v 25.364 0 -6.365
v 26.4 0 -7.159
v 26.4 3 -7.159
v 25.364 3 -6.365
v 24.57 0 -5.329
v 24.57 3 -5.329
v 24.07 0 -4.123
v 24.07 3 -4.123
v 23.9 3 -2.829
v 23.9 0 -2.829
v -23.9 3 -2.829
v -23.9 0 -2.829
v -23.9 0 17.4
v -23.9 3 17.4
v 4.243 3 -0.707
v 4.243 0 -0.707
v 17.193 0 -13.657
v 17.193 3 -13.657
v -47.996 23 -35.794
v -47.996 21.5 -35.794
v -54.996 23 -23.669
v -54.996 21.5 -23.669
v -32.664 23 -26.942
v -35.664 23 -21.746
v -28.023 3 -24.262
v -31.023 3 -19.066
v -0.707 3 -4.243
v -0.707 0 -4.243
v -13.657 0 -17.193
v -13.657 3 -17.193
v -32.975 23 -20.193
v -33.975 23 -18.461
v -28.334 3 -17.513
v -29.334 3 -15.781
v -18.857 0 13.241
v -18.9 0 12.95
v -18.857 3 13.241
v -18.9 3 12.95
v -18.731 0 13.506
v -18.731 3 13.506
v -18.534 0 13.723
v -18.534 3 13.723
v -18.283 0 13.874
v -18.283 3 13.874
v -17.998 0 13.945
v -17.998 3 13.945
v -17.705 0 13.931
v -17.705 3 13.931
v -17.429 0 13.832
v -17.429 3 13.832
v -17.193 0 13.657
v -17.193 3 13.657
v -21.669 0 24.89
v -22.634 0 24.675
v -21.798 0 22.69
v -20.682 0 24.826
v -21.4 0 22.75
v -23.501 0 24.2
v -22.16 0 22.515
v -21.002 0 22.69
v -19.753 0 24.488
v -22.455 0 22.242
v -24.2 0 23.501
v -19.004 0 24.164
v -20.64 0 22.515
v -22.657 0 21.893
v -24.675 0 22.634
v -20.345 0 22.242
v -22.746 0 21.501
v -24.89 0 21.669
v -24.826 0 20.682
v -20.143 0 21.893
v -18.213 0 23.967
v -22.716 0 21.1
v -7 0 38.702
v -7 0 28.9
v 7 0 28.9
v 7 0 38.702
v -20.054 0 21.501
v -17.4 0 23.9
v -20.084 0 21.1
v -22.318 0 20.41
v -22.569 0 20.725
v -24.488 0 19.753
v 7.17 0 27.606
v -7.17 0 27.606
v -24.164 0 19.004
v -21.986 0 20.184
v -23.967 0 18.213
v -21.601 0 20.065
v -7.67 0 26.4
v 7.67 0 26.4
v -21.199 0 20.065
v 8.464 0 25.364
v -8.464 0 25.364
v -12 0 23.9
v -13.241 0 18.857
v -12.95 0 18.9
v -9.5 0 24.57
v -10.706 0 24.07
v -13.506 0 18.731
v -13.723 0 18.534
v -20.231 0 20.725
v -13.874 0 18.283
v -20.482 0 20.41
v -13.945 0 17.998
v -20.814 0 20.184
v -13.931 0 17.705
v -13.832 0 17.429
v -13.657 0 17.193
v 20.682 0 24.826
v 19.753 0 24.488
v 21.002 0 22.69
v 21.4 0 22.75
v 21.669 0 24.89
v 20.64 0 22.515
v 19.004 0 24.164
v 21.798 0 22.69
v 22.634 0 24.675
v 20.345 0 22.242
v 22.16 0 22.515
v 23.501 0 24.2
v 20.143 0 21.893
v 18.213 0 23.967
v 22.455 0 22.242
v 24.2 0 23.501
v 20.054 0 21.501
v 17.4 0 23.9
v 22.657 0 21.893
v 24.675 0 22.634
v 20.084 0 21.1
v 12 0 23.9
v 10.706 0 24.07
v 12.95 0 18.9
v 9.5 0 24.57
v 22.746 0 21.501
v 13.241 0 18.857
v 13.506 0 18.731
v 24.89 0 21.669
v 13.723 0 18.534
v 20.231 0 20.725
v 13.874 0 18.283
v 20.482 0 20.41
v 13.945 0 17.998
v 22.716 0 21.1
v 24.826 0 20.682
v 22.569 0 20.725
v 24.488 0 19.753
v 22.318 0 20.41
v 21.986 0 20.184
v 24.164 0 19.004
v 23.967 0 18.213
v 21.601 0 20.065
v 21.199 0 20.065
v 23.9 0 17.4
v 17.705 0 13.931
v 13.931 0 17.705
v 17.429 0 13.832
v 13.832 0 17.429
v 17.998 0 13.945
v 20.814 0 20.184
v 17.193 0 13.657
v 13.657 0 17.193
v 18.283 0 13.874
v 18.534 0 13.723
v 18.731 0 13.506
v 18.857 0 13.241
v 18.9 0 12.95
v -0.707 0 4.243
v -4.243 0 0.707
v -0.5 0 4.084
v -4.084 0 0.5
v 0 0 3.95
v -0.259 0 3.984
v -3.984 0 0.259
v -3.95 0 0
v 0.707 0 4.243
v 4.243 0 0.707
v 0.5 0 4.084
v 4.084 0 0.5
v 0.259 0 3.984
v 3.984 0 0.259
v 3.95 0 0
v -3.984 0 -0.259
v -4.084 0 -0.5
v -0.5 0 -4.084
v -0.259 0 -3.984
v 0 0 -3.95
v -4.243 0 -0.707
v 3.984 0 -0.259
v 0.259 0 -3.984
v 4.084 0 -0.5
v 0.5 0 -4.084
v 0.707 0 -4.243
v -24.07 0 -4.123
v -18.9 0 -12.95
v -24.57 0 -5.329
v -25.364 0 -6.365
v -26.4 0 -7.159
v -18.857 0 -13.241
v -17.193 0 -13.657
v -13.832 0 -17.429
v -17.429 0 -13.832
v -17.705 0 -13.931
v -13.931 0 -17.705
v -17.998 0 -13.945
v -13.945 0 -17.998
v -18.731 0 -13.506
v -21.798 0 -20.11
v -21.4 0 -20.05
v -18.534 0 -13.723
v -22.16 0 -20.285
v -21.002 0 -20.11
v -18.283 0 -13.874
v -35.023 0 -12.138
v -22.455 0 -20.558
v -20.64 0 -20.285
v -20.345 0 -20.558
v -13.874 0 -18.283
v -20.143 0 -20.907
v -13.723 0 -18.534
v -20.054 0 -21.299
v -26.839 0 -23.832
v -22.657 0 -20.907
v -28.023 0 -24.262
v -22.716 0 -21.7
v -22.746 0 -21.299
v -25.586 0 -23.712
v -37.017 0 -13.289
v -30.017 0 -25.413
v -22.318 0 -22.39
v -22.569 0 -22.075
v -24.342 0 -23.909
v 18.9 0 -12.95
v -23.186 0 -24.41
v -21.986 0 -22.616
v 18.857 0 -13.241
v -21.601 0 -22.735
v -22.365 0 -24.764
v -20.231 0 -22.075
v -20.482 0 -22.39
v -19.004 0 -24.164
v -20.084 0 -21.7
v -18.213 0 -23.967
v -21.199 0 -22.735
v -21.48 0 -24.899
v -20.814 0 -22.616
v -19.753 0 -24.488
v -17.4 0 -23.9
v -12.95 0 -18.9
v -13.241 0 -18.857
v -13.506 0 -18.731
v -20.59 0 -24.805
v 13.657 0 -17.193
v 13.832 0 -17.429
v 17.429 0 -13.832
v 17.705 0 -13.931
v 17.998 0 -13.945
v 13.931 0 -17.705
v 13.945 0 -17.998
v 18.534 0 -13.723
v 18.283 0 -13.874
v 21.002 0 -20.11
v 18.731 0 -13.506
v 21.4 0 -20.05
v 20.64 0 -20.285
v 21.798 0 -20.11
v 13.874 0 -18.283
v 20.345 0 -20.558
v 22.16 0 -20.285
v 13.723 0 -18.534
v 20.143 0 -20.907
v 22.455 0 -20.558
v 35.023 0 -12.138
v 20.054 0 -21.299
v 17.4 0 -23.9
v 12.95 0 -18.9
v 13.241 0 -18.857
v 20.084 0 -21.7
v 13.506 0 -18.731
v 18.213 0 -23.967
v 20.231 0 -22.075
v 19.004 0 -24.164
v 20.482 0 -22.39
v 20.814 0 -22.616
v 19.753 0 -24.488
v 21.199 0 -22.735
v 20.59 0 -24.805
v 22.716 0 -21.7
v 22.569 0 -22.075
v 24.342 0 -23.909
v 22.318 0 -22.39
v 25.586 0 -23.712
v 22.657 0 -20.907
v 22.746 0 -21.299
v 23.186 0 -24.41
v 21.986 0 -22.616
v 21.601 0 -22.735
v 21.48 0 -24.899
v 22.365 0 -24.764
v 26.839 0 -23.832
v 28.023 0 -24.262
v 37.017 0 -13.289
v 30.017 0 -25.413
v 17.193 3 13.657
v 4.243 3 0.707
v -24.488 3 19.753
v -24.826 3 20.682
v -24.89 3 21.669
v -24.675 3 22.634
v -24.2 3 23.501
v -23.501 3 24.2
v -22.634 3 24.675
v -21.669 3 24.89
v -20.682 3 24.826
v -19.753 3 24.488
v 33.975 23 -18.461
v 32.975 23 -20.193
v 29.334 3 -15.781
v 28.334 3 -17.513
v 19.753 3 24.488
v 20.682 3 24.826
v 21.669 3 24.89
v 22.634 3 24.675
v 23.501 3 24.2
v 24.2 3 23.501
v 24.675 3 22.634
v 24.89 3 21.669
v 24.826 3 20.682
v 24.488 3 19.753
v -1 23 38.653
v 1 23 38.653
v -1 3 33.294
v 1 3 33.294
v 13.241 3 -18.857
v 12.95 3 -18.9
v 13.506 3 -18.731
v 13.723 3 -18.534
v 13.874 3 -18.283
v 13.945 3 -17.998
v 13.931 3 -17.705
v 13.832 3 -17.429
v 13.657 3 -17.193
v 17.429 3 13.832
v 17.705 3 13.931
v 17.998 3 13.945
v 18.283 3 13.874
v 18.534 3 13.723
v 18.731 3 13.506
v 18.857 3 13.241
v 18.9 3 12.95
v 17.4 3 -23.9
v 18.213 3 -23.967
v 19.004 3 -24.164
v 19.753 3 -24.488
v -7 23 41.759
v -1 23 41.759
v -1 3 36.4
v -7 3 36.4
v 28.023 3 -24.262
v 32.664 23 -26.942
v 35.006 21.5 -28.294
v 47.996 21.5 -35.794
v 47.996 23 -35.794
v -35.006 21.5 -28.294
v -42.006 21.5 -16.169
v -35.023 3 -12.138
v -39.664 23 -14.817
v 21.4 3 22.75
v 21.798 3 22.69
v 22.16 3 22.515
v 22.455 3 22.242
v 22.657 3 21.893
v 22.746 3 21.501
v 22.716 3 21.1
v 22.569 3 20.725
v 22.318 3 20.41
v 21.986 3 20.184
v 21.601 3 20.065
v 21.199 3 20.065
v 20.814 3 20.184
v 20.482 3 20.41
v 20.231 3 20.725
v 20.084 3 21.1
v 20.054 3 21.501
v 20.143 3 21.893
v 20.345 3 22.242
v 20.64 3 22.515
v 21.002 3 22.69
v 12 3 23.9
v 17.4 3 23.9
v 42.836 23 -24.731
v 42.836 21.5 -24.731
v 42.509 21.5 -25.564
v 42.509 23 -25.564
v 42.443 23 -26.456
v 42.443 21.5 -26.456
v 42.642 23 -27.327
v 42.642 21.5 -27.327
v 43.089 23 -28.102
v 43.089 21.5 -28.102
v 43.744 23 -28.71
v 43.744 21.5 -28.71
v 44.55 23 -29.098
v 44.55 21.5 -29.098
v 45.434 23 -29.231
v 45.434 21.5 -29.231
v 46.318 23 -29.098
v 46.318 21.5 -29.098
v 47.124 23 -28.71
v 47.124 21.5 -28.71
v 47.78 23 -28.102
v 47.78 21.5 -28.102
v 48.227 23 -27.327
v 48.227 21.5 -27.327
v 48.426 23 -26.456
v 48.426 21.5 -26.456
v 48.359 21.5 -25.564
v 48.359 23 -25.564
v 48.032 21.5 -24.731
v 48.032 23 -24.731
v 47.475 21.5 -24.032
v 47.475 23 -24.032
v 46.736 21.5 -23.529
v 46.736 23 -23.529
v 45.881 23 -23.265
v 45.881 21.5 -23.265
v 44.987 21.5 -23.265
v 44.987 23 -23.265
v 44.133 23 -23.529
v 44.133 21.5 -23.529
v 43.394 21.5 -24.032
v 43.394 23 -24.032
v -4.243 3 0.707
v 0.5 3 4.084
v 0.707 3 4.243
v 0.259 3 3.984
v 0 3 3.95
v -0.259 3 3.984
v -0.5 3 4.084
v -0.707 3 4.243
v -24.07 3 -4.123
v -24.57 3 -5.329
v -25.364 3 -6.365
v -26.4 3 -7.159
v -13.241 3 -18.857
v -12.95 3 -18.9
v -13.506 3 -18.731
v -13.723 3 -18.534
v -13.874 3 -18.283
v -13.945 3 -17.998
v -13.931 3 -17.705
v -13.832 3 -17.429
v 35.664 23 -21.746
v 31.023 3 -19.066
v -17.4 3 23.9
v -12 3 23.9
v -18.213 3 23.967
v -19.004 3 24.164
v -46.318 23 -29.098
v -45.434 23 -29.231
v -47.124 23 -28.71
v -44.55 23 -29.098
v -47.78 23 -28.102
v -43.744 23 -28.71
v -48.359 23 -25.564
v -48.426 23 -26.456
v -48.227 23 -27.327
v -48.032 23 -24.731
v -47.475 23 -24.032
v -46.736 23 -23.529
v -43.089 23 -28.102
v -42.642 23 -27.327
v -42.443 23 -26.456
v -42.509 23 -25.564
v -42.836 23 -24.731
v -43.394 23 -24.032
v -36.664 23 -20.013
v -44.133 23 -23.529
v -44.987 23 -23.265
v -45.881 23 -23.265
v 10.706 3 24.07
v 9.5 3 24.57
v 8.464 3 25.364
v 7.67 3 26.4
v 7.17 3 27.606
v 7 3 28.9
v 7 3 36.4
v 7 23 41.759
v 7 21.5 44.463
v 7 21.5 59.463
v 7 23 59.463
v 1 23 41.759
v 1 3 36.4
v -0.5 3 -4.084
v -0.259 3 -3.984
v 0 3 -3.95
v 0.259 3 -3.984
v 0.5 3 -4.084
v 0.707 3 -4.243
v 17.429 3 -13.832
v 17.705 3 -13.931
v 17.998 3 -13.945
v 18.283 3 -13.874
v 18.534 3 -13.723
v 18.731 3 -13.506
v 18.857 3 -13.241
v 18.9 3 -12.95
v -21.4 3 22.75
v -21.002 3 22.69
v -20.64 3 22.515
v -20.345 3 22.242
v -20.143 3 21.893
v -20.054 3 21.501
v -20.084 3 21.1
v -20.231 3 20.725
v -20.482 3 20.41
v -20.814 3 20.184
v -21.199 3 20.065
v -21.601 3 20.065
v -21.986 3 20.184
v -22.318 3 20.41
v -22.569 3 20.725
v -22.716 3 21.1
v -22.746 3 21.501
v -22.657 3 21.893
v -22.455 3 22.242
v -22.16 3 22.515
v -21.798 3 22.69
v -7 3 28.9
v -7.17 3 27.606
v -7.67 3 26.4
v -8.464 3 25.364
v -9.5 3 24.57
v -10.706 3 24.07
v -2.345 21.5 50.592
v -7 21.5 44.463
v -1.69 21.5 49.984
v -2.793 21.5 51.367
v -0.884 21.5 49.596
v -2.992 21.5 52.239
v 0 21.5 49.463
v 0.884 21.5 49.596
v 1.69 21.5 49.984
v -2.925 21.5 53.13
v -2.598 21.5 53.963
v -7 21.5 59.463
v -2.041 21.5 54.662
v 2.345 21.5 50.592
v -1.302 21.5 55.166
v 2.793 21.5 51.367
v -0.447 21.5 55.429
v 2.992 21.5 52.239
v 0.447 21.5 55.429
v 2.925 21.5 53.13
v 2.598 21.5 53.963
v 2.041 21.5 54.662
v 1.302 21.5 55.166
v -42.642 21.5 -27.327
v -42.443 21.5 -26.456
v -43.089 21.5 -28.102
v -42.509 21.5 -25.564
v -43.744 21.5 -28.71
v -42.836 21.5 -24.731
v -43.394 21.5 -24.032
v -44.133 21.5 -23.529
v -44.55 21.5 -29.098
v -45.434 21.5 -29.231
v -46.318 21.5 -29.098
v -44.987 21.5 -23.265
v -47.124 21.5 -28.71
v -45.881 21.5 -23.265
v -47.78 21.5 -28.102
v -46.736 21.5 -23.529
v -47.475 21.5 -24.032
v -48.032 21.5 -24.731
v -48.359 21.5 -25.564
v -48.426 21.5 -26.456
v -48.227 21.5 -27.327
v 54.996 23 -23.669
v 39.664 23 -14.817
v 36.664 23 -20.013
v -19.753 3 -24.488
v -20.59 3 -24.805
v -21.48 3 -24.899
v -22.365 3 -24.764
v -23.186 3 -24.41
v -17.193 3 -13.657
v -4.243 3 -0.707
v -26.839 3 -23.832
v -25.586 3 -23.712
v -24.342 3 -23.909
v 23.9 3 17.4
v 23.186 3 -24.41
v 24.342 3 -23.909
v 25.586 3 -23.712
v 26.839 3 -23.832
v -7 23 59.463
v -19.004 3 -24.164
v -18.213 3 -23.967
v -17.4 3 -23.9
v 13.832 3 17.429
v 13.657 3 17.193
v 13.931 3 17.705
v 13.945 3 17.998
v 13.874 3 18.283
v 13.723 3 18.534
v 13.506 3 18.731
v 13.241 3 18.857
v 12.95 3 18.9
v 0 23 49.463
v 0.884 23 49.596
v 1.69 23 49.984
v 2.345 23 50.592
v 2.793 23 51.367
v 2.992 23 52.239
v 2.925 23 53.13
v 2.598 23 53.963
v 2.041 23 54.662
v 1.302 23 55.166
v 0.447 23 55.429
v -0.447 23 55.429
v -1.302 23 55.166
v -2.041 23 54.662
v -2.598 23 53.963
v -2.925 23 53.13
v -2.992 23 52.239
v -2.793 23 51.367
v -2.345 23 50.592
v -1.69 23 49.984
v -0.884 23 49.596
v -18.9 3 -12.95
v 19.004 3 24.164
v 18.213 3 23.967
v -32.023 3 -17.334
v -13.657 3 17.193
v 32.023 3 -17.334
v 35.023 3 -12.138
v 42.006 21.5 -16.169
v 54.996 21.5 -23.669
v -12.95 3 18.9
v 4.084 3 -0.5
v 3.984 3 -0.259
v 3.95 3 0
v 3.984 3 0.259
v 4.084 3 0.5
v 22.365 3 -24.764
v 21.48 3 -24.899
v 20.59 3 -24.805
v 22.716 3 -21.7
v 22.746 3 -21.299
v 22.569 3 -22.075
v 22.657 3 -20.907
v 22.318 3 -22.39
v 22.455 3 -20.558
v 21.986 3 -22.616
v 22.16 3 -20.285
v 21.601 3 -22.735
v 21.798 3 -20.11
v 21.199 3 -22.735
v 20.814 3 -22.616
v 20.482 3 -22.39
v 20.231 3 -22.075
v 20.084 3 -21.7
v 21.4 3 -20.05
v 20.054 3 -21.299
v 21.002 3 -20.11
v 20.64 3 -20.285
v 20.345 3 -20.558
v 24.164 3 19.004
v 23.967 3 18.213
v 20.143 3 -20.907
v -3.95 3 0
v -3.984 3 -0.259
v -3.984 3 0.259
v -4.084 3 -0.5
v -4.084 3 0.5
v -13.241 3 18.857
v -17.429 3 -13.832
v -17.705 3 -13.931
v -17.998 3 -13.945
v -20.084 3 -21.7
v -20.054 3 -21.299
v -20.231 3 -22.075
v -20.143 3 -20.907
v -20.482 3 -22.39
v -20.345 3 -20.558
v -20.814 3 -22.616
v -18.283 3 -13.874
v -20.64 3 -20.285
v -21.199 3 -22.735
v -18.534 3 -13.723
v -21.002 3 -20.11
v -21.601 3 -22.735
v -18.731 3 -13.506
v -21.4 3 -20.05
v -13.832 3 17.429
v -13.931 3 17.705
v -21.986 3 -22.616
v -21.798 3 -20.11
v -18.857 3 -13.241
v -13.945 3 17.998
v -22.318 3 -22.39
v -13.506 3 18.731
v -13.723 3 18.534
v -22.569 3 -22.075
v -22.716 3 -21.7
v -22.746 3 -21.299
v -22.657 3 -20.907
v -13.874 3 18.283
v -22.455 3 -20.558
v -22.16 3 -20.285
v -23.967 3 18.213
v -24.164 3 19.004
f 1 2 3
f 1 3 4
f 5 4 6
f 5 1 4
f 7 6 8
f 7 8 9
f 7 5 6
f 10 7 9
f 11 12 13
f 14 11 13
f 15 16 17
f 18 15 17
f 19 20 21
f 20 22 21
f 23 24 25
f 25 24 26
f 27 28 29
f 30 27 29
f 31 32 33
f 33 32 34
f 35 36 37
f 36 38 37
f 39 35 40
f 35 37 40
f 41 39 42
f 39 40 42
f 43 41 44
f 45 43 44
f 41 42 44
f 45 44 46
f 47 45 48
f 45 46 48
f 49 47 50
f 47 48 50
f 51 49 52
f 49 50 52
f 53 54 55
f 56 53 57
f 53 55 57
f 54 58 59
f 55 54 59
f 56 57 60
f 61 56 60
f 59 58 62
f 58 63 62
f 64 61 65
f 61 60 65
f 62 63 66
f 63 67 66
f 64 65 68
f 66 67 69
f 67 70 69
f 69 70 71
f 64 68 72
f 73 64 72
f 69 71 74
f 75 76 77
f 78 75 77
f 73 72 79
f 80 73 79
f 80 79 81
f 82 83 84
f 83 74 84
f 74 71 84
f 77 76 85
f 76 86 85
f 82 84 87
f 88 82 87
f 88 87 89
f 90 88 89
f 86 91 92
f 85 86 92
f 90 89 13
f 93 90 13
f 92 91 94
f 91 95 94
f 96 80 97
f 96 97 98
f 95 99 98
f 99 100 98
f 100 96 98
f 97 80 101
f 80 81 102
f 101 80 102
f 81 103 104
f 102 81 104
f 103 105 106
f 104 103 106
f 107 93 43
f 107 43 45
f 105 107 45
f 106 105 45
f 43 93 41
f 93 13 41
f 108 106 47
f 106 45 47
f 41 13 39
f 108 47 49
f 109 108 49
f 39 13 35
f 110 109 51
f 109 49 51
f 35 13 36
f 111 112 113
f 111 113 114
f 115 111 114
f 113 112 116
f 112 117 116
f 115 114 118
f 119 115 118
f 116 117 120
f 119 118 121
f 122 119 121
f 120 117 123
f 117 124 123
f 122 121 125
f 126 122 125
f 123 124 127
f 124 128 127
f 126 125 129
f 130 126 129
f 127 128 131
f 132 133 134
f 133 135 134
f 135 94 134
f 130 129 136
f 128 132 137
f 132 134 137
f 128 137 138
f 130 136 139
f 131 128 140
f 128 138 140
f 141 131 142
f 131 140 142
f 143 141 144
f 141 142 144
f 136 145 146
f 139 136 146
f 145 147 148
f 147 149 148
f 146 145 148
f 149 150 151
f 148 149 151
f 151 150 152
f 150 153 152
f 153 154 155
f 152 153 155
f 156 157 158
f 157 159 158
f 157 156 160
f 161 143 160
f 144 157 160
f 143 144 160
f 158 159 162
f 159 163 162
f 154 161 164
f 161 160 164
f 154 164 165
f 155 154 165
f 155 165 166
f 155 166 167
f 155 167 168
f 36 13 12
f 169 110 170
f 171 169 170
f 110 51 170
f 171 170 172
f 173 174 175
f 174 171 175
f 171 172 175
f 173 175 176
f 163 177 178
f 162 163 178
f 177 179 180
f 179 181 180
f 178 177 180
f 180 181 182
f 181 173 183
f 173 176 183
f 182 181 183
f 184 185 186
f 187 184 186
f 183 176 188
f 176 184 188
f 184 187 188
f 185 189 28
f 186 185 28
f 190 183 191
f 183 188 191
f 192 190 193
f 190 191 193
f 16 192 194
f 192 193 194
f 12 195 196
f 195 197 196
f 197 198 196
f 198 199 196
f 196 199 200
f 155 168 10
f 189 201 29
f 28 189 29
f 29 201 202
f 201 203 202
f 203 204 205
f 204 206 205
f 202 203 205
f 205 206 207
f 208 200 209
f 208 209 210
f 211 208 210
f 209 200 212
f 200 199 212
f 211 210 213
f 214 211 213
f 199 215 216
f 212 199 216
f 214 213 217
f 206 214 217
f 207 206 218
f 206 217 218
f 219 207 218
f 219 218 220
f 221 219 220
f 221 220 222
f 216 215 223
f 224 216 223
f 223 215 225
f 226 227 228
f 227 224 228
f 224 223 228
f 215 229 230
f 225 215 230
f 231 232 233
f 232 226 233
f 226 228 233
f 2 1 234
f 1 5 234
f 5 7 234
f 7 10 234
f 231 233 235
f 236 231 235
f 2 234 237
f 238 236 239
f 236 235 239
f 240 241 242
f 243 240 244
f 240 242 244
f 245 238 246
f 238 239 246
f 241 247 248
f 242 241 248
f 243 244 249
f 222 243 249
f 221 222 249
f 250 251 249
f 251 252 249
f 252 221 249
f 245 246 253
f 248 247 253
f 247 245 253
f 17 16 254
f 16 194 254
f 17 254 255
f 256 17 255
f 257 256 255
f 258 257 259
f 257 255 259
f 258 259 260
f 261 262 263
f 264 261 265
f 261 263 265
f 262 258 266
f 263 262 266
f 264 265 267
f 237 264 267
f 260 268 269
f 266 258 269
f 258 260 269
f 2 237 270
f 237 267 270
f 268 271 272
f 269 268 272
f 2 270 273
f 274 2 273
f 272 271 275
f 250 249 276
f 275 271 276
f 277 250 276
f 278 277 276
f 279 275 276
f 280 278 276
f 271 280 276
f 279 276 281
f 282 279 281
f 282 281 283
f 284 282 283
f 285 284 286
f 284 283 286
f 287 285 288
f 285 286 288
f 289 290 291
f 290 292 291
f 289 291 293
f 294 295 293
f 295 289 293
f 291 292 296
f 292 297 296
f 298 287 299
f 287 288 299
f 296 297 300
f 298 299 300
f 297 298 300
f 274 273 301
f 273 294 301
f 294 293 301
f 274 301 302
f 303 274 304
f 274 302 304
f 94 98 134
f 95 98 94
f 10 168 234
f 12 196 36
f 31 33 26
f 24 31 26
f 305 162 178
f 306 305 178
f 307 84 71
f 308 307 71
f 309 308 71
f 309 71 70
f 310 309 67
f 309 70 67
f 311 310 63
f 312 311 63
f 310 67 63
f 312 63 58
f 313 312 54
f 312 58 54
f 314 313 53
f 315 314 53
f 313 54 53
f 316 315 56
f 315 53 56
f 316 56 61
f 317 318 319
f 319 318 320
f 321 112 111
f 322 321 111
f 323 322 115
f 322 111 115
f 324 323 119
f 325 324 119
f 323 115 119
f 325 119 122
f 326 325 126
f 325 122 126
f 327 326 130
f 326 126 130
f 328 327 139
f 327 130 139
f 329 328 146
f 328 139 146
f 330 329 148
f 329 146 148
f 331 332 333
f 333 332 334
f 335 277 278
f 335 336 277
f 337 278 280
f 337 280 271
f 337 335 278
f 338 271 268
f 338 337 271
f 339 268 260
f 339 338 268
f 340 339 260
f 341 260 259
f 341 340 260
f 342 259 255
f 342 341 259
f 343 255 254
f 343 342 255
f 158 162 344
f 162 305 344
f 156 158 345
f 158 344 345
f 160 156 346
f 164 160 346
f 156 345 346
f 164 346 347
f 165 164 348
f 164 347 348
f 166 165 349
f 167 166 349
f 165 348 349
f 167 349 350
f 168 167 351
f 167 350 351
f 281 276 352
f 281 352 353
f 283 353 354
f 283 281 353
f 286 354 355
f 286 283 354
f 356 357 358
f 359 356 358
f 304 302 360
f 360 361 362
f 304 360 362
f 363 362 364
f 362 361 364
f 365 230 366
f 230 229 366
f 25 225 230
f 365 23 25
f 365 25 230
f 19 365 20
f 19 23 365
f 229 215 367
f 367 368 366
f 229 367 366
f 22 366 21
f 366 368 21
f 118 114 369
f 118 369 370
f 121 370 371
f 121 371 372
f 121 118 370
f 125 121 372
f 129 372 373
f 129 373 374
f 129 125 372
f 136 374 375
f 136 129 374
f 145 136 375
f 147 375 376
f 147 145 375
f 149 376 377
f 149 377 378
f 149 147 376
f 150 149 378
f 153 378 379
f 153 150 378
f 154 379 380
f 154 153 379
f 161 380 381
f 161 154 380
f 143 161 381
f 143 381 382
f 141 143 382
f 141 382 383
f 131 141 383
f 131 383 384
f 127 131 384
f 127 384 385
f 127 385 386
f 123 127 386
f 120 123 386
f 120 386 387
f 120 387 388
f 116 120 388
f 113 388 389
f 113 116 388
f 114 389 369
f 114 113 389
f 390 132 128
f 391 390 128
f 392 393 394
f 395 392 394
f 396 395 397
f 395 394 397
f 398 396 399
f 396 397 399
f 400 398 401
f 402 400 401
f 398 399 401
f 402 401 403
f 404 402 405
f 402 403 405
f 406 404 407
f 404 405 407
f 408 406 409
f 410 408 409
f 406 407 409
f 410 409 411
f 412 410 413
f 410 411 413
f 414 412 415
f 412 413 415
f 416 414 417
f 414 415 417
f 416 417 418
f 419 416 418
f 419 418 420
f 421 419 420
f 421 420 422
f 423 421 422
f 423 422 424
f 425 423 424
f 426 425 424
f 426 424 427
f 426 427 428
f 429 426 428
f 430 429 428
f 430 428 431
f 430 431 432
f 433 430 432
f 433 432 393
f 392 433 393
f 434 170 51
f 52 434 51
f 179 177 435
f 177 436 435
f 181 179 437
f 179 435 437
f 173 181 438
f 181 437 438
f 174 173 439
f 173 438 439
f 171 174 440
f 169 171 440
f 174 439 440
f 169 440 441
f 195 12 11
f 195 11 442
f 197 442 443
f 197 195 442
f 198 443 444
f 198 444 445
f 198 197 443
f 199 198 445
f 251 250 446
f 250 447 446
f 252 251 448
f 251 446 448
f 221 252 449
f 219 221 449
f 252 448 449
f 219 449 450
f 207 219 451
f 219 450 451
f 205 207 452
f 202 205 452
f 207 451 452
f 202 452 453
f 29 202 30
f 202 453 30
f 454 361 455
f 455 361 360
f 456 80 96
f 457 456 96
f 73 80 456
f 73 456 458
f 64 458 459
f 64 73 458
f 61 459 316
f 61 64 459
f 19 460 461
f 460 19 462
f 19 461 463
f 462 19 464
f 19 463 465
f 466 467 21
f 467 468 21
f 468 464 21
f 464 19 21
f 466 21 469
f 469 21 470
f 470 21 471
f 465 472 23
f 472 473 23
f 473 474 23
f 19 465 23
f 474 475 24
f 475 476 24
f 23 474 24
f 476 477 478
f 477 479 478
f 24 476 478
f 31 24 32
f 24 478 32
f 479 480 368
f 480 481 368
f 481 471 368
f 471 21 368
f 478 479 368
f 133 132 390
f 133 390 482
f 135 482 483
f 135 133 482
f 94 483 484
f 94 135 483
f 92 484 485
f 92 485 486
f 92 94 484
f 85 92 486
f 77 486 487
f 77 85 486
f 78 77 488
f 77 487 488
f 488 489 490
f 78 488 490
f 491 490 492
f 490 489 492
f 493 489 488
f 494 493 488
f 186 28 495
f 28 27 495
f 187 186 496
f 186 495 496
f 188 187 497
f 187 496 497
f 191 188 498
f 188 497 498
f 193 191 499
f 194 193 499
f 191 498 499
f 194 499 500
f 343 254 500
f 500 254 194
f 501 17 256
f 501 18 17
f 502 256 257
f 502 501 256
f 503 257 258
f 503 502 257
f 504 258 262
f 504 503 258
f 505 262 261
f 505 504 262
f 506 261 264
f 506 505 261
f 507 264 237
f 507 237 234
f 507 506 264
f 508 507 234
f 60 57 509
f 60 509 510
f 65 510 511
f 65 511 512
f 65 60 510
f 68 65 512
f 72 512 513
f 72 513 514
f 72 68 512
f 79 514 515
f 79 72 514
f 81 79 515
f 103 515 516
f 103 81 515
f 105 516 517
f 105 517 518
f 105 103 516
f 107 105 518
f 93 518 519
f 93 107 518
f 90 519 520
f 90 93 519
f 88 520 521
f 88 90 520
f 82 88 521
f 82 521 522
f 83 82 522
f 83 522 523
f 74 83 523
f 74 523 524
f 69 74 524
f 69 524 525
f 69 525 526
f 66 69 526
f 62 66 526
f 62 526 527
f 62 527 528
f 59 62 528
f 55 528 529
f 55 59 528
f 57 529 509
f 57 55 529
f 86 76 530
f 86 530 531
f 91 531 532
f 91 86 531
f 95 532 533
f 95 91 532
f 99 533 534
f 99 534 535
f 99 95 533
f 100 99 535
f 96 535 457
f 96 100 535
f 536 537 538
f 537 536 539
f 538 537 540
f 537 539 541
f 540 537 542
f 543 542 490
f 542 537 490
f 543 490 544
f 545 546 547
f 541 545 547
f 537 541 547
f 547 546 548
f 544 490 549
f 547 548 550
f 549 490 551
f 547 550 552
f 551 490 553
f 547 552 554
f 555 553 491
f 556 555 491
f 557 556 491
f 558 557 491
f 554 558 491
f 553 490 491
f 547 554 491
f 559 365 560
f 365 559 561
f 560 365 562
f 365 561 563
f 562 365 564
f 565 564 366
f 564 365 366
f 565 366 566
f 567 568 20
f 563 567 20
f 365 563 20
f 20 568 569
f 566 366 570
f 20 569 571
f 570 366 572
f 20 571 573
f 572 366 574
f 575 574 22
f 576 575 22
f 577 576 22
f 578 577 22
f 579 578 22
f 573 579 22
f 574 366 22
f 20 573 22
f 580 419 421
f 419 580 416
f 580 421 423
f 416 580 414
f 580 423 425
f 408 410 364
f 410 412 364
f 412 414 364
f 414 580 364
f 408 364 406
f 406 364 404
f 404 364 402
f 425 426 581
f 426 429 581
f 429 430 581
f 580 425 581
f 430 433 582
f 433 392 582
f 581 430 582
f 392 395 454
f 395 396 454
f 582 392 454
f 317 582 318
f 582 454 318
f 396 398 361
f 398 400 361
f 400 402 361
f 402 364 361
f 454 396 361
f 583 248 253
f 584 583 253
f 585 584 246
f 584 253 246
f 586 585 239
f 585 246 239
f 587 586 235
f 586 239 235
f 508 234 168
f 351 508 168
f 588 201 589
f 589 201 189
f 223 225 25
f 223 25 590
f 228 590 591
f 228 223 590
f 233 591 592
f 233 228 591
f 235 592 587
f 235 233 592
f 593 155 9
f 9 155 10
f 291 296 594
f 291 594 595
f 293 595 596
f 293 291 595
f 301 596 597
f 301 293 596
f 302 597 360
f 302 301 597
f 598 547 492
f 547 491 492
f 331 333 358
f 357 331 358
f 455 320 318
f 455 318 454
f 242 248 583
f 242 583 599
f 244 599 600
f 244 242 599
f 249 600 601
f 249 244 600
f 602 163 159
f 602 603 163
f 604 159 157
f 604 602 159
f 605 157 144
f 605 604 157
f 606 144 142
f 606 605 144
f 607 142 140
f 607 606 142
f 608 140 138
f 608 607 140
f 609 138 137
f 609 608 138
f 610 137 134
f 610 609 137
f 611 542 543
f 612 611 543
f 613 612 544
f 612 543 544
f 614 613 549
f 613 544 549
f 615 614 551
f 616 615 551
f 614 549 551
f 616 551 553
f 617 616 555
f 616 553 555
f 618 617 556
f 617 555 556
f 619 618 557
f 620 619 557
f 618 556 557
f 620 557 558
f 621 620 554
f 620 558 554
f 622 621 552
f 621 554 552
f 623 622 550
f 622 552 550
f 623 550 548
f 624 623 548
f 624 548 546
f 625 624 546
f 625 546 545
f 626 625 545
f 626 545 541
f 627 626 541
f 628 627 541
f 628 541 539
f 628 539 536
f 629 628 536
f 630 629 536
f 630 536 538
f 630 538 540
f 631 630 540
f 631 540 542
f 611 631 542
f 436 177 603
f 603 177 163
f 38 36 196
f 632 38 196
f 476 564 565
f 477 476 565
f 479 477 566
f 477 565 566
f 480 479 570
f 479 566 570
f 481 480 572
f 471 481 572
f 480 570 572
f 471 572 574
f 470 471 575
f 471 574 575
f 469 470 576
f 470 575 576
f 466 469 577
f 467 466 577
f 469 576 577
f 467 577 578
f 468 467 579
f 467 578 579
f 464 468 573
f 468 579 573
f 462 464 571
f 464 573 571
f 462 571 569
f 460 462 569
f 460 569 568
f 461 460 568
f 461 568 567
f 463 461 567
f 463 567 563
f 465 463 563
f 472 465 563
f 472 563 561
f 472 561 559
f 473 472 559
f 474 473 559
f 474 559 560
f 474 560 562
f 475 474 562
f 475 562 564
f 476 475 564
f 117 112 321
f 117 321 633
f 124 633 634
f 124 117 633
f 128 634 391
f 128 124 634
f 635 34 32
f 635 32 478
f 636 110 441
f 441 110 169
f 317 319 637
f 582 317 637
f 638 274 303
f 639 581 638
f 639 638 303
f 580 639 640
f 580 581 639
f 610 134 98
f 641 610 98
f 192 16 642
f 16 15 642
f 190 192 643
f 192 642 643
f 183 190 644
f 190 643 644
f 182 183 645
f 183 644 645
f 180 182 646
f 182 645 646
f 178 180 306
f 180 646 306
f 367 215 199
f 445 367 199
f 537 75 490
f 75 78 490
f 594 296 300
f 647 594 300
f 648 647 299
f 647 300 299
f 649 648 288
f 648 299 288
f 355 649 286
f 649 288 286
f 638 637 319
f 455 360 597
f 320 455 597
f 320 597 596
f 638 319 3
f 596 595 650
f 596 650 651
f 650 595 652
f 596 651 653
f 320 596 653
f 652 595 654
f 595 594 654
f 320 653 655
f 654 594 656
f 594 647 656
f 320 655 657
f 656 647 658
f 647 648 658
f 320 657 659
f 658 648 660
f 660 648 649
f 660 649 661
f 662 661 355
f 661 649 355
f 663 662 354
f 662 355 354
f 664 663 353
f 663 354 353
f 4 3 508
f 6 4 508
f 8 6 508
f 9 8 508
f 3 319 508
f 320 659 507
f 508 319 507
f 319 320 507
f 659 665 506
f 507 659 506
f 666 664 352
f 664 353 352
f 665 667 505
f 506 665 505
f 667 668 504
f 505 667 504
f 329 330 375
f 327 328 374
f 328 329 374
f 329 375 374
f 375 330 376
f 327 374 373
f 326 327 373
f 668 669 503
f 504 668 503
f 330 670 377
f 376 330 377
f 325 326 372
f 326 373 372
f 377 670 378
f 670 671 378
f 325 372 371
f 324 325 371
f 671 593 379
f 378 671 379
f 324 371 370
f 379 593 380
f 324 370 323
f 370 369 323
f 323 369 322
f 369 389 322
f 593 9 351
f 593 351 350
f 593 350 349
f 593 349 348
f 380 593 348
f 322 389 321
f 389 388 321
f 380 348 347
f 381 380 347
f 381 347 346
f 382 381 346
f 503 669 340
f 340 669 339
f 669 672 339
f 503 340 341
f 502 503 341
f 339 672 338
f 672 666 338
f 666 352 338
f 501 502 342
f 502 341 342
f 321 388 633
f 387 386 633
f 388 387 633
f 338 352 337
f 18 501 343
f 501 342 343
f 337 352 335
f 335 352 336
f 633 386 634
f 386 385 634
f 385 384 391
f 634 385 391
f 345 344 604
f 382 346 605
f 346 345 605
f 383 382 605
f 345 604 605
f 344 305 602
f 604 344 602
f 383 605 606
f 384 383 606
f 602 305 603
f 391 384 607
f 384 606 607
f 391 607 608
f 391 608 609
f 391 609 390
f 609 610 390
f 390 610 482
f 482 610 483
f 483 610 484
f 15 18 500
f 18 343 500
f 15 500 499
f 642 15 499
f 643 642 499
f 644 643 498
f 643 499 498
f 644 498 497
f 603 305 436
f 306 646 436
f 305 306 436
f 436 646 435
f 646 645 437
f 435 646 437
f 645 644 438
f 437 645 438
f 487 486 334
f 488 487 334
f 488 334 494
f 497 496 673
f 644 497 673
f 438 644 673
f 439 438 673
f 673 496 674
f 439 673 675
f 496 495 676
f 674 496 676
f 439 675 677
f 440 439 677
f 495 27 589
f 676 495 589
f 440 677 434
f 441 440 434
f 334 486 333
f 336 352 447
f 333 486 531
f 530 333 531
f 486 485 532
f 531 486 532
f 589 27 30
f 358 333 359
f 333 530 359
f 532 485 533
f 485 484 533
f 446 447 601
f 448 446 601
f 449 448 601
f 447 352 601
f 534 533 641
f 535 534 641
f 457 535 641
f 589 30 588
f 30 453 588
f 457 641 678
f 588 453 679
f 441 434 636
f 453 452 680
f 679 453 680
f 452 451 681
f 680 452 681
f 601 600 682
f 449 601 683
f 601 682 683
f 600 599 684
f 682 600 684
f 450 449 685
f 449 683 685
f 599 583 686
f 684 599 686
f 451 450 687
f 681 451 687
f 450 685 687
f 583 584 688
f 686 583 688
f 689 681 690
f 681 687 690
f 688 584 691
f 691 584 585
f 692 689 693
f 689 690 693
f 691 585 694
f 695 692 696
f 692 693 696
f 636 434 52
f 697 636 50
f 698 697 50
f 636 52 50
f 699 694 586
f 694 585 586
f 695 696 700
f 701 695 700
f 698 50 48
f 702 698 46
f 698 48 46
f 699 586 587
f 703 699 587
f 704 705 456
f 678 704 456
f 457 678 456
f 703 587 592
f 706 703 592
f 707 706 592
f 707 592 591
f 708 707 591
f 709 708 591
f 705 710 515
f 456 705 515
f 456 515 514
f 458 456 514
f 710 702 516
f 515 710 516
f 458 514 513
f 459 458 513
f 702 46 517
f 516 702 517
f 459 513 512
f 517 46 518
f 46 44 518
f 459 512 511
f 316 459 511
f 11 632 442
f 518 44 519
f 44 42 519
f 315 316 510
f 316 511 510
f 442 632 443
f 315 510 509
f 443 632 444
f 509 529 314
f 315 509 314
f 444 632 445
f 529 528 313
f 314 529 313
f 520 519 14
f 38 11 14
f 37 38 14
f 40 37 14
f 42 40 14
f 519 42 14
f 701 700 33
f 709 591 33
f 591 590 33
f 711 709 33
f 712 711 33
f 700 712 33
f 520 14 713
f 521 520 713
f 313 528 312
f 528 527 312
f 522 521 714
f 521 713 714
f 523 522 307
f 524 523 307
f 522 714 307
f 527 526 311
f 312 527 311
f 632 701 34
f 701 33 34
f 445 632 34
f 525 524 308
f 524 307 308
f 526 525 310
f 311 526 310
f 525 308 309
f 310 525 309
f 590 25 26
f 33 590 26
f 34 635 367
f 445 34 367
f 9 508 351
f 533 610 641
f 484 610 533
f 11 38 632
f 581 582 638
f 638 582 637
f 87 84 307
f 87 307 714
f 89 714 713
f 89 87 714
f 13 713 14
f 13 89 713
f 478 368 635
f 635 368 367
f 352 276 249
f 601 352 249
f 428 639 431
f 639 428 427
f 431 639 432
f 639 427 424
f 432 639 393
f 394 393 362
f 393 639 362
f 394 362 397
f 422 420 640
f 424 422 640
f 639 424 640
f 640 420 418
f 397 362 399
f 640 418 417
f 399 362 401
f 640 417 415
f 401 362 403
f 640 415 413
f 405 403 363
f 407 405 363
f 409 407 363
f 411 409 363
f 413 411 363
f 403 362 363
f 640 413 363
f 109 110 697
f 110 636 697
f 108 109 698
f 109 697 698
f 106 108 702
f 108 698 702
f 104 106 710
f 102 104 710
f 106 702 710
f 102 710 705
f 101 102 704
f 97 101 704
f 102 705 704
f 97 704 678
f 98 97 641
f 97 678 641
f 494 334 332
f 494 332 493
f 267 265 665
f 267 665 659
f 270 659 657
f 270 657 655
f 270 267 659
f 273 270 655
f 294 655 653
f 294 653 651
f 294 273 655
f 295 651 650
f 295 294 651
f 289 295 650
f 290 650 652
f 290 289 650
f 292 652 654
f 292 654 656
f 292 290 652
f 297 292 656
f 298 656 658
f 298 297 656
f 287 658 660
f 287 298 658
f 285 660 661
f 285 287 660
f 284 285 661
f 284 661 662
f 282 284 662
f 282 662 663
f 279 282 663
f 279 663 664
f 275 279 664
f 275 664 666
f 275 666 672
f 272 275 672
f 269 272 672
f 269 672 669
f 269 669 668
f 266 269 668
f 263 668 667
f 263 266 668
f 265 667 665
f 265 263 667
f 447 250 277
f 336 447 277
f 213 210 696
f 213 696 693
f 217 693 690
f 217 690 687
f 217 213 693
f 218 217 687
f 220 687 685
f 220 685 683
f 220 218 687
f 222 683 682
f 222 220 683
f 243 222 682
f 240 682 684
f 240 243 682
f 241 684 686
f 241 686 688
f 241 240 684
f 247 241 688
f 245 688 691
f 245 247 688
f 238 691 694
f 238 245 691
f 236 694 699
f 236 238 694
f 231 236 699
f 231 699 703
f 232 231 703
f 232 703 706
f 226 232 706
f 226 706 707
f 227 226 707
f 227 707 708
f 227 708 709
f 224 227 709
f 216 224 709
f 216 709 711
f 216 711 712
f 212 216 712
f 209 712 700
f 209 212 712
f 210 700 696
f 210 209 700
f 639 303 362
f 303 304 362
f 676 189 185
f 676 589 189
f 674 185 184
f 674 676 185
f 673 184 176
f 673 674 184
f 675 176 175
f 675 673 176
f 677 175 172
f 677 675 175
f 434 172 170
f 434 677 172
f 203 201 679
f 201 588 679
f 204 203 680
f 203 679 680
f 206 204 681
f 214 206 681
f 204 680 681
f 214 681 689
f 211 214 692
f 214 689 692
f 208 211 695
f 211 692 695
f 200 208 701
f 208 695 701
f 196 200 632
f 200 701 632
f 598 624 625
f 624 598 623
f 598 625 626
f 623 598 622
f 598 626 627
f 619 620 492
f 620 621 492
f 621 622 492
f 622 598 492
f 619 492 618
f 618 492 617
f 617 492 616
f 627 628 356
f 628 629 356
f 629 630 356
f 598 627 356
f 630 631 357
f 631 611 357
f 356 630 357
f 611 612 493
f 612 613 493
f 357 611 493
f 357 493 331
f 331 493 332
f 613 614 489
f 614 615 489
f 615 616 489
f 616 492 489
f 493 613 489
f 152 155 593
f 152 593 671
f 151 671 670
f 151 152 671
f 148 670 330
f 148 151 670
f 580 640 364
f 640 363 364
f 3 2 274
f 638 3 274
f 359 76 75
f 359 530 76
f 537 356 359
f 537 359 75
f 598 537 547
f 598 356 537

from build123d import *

# Parameters (mm, degrees)
SKETCH1_R           = 1.35
BOSS_EXTRUDE1_DEPTH = 3
FILLET1_R           = 5
FILLET2_R           = 1
BOSS_EXTRUDE2_DEPTH = 7
BOSS_EXTRUDE3_DEPTH = 1
CUT_EXTRUDE1_REACH  = 74.282
SKETCH3_R           = 3
CIRPATTERN3_COUNT   = 3


with BuildPart() as part:
    # Sketch1 → Boss-Extrude1 (new body)
    with BuildSketch(Plane(origin=(0, 0, 0), x_dir=(1, 0, 0), z_dir=(0, 1, 0))):
        with BuildLine():
            ThreePointArc((-18.950510257, 23.9), (-22.286742625, 24.785806775), (-24.760474821, 22.378370572))
            Line((-24.760474821, 22.378370572), (-28.023324698, 24.262177826))
            Line((-28.023324698, 24.262177826), (-35.023324698, 12.137822174))
            Line((-35.023324698, 12.137822174), (-23.9, 5.715767665))
            Line((-23.9, 5.715767665), (-23.9, -18.950510257))
            ThreePointArc((-23.9, -18.950510257), (-23.874873734, -23.874873734), (-18.950510257, -23.9))
            Line((-18.950510257, -23.9), (-7, -23.9))
            Line((-7, -23.9), (-7, -36.4))
            Line((-7, -36.4), (7, -36.4))
            Line((7, -36.4), (7, -23.9))
            Line((7, -23.9), (18.950510257, -23.9))
            ThreePointArc((18.950510257, -23.9), (23.874873734, -23.874873734), (23.9, -18.950510257))
            Line((23.9, -18.950510257), (23.9, 5.715767665))
            Line((23.9, 5.715767665), (35.023324698, 12.137822174))
            Line((35.023324698, 12.137822174), (28.023324698, 24.262177826))
            Line((28.023324698, 24.262177826), (24.760474821, 22.378370572))
            ThreePointArc((24.760474821, 22.378370572), (22.286742625, 24.785806775), (18.950510257, 23.9))
            Line((18.950510257, 23.9), (-18.950510257, 23.9))
        make_face()
        with Locations(Location((-21.4, -21.4, 0), (0, 0, 270))):
            Circle(SKETCH1_R, mode=Mode.SUBTRACT)
        Polygon((15.364466094, -18.9), (-15.364466094, -18.9), (0, -3.535533906), align=None, mode=Mode.SUBTRACT)
        with Locations(Location((21.4, -21.4, 0), (0, 0, 270))):
            Circle(SKETCH1_R, mode=Mode.SUBTRACT)
        Polygon((-3.535533906, 0), (-18.9, -15.364466094), (-18.9, 15.364466094), align=None, mode=Mode.SUBTRACT)
        with Locations(Location((-21.4, 21.4, 0), (0, 0, 270))):
            Circle(SKETCH1_R, mode=Mode.SUBTRACT)
        Polygon((18.9, -15.364466094), (3.535533906, 0), (18.9, 15.364466094), align=None, mode=Mode.SUBTRACT)
        Polygon((0, 3.535533906), (-15.364466094, 18.9), (15.364466094, 18.9), align=None, mode=Mode.SUBTRACT)
        with Locations(Location((21.4, 21.4, 0), (0, 0, 270))):
            Circle(SKETCH1_R, mode=Mode.SUBTRACT)
    extrude(amount=BOSS_EXTRUDE1_DEPTH)

    # Fillet1
    # the kernel refuses this fillet: 5 mm, written as the material it adds along each edge
    with BuildSketch(Plane(origin=(7, 0, 23.9), x_dir=(0, 0, 1), z_dir=(0, 1, 0)), Plane(origin=(-7, 0, 23.9), x_dir=(-1, 0, 0), z_dir=(0, 1, 0))) as fillet1_piece_1:
        with BuildLine():
            CenterArc((FILLET1_R, FILLET1_R), FILLET1_R, 180, 90)
            Line((0, FILLET1_R), (-FILLET1_R * 0.02, FILLET1_R))
            Line((-FILLET1_R * 0.02, FILLET1_R), (-FILLET1_R * 0.02, -FILLET1_R * 0.02))
            Line((-FILLET1_R * 0.02, -FILLET1_R * 0.02), (FILLET1_R, -FILLET1_R * 0.02))
            Line((FILLET1_R, -FILLET1_R * 0.02), (FILLET1_R, 0))
        make_face()
    extrude(amount=3)
    with BuildSketch(Plane(origin=(23.9, 0, 18.950510257), x_dir=(0.5912237553807399, 0, 0.8065075765753815), z_dir=(0, 1, 0)), Plane(origin=(-18.950510257, 0, 23.9), x_dir=(-0.806507576575308, 0, 0.5912237553808403), z_dir=(0, 1, 0)), Plane(origin=(18.950510257, 0, -23.9), x_dir=(0.8065075765752107, 0, -0.591223755380973), z_dir=(0, 1, 0))) as fillet1_piece_2:
        with BuildLine():
            CenterArc((1.705620507, 4.94923638), FILLET1_R, 233.756102233, 28.072486936)
            Line((-1.25049827, 0.916698497), (-1.309620646, 0.836047739))
            Line((-1.309620646, 0.836047739), (-0.059122376, -0.080650758))
            Line((-0.059122376, -0.080650758), (0.014213504, -0.098984728))
            ThreePointArc((0.014213504, -0.098984728), (0.497472648, -0.064465466), (0.980731791, -0.098984728))
            Line((0.980731791, -0.098984728), (0.994945296, 0))
        make_face()
    extrude(amount=3)
    with BuildSketch(Plane(origin=(18.950510257, 0, 23.9), x_dir=(-1, 0, 0), z_dir=(0, 1, 0)), Plane(origin=(-23.9, 0, 18.950510257), x_dir=(0, 0, -1), z_dir=(0, 1, 0)), Plane(origin=(-18.950510257, 0, -23.9), x_dir=(1, 0, 0), z_dir=(0, 1, 0))) as fillet1_piece_3:
        with BuildLine():
            CenterArc((1.550510257, 5), FILLET1_R, 241.927513064, 28.072486936)
            Line((-0.802430919, 0.588235294), (-0.849489743, 0.5))
            ThreePointArc((-0.849489743, 0.5), (-0.439328974, 0.24212576), (-0.069985421, -0.071428571))
            Line((-0.069985421, -0.071428571), (0, -0.1))
            Line((0, -0.1), (1.550510257, -0.1))
            Line((1.550510257, -0.1), (1.550510257, 0))
        make_face()
    extrude(amount=3)
    with BuildSketch(Plane(origin=(-23.9, 0, -5.715767665), x_dir=(-0.8660254037844421, 0, -0.49999999999999417), z_dir=(0, 1, 0)), Plane(origin=(23.9, 0, -5.715767665), x_dir=(0, 0, 1), z_dir=(0, 1, 0))) as fillet1_piece_4:
        with BuildLine():
            CenterArc((FILLET1_R * 0.57735026919, FILLET1_R), FILLET1_R, 210, 60)
            Line((-FILLET1_R * 0.288675134595, FILLET1_R * 0.5), (-FILLET1_R * 0.30599564267, FILLET1_R * 0.49))
            Line((-FILLET1_R * 0.30599564267, FILLET1_R * 0.49), (-FILLET1_R * 0.0115470053838, -FILLET1_R * 0.02))
            Line((-FILLET1_R * 0.0115470053838, -FILLET1_R * 0.02), (FILLET1_R * 0.57735026919, -FILLET1_R * 0.02))
            Line((FILLET1_R * 0.57735026919, -FILLET1_R * 0.02), (FILLET1_R * 0.57735026919, 0))
        make_face()
    extrude(amount=3)
    with BuildSketch(Plane(origin=(24.760474821, 0, -22.378370572), x_dir=(-0.6125107821213894, 0, -0.7904622329909531), z_dir=(0, 1, 0))) as fillet1_piece_5:
        with BuildLine():
            CenterArc((4.405584254, -4.650844222), FILLET1_R, 111.538849964, 57.883583887)
            Line((-0.509452241, -3.733011854), (-0.607752971, -3.714655207))
            ThreePointArc((-0.607752971, -3.714655207), (-0.353807697, -1.852984049), (-0.099081577, 0.013521878))
            Line((-0.099081577, 0.013521878), (0.036713202, 0.093016884))
            ThreePointArc((0.036713202, 0.093016884), (1.284962074, -0.144409045), (2.533210946, 0.093016884))
            Line((2.533210946, 0.093016884), (2.569924148, 0))
        make_face()
    extrude(amount=3)
    with BuildSketch(Plane(origin=(-24.760474821, 0, -22.378370572), x_dir=(0.6125107821216187, 0, -0.7904622329907753), z_dir=(0, 1, 0))) as fillet1_piece_6:
        with BuildLine():
            CenterArc((4.405584254, 4.650844222), FILLET1_R, 190.577566149, 57.883583887)
            Line((-0.509452241, 3.733011854), (-0.607752971, 3.714655207))
            ThreePointArc((-0.607752971, 3.714655207), (-0.353807697, 1.852984049), (-0.099081577, -0.013521878))
            Line((-0.099081577, -0.013521878), (0.036713202, -0.093016884))
            ThreePointArc((0.036713202, -0.093016884), (1.284962074, 0.144409045), (2.533210946, -0.093016884))
            Line((2.533210946, -0.093016884), (2.569924148, 0))
        make_face()
    extrude(amount=3)

    # Fillet2
    fillet2_edges = [part.edges().sort_by_distance(p)[0] for p in [
        (15.364466094, 1.5, -18.9),
        (-15.364466094, 1.5, -18.9),
        (0, 1.5, -3.535533906),
        (-18.9, 1.5, 15.364466094),
        (-3.535533906, 1.5, 0),
        (-18.9, 1.5, -15.364466094),
        (18.9, 1.5, 15.364466094),
        (18.9, 1.5, -15.364466094),
        (3.535533906, 1.5, 0),
        (-15.364466094, 1.5, 18.9),
        (15.364466094, 1.5, 18.9),
        (0, 1.5, 3.535533906),
    ]]
    fillet(fillet2_edges, radius=FILLET2_R)

    # Sketch2 → Boss-Extrude2 (add, symmetric)
    with BuildSketch(Plane(origin=(0, 0, 0), x_dir=(0, 0, -1), z_dir=(1, 0, 0))):
        Polygon((-36.4, 3), (-36.4, 0), (-38.701980964, 0), (-44.462888601, 21.5), (-59.462888601, 21.5), (-59.462888601, 23), (-41.758983849, 23), align=None)
    boss_extrude2 = extrude(amount=BOSS_EXTRUDE2_DEPTH, both=True)

    # Sketch2<3> → Boss-Extrude3 (add, symmetric)
    with BuildSketch(Plane(origin=(0, 0, 0), x_dir=(0, 0, -1), z_dir=(1, 0, 0))):
        Polygon((-33.294171459, 3), (-36.4, 3), (-41.758983849, 23), (-38.653155307, 23), align=None)
    boss_extrude3 = extrude(amount=BOSS_EXTRUDE3_DEPTH, both=True)

    # Sketch3 → Cut-Extrude1 (cut, up to next)
    with BuildSketch(Plane.XZ.offset(-21.5), mode=Mode.PRIVATE) as cut_extrude1_sk1:
        with Locations(Location((0, 52.462888601, 0), (0, 0, 270))):
            Circle(SKETCH3_R)
    cut_extrude1_tool1 = extrude(cut_extrude1_sk1.sketch, amount=-CUT_EXTRUDE1_REACH, mode=Mode.PRIVATE) & part.part
    cut_extrude1 = cut_extrude1_tool1.solids().sort_by_distance((0, 21.5, 52.462889))[0]
    add(cut_extrude1, mode=Mode.SUBTRACT)

    # CirPattern3: Boss-Extrude2, Boss-Extrude3, Cut-Extrude1 ×3 about axis
    cirpattern3_axis = Axis((0, 0, 0), (0, 1, 0))
    add([boss_extrude2.rotate(cirpattern3_axis, i * 360 / CIRPATTERN3_COUNT) for i in range(1, CIRPATTERN3_COUNT)])
    add([boss_extrude3.rotate(cirpattern3_axis, i * 360 / CIRPATTERN3_COUNT) for i in range(1, CIRPATTERN3_COUNT)])
    add([cut_extrude1.rotate(cirpattern3_axis, i * 360 / CIRPATTERN3_COUNT) for i in range(1, CIRPATTERN3_COUNT)], mode=Mode.SUBTRACT)


solid = part.part
